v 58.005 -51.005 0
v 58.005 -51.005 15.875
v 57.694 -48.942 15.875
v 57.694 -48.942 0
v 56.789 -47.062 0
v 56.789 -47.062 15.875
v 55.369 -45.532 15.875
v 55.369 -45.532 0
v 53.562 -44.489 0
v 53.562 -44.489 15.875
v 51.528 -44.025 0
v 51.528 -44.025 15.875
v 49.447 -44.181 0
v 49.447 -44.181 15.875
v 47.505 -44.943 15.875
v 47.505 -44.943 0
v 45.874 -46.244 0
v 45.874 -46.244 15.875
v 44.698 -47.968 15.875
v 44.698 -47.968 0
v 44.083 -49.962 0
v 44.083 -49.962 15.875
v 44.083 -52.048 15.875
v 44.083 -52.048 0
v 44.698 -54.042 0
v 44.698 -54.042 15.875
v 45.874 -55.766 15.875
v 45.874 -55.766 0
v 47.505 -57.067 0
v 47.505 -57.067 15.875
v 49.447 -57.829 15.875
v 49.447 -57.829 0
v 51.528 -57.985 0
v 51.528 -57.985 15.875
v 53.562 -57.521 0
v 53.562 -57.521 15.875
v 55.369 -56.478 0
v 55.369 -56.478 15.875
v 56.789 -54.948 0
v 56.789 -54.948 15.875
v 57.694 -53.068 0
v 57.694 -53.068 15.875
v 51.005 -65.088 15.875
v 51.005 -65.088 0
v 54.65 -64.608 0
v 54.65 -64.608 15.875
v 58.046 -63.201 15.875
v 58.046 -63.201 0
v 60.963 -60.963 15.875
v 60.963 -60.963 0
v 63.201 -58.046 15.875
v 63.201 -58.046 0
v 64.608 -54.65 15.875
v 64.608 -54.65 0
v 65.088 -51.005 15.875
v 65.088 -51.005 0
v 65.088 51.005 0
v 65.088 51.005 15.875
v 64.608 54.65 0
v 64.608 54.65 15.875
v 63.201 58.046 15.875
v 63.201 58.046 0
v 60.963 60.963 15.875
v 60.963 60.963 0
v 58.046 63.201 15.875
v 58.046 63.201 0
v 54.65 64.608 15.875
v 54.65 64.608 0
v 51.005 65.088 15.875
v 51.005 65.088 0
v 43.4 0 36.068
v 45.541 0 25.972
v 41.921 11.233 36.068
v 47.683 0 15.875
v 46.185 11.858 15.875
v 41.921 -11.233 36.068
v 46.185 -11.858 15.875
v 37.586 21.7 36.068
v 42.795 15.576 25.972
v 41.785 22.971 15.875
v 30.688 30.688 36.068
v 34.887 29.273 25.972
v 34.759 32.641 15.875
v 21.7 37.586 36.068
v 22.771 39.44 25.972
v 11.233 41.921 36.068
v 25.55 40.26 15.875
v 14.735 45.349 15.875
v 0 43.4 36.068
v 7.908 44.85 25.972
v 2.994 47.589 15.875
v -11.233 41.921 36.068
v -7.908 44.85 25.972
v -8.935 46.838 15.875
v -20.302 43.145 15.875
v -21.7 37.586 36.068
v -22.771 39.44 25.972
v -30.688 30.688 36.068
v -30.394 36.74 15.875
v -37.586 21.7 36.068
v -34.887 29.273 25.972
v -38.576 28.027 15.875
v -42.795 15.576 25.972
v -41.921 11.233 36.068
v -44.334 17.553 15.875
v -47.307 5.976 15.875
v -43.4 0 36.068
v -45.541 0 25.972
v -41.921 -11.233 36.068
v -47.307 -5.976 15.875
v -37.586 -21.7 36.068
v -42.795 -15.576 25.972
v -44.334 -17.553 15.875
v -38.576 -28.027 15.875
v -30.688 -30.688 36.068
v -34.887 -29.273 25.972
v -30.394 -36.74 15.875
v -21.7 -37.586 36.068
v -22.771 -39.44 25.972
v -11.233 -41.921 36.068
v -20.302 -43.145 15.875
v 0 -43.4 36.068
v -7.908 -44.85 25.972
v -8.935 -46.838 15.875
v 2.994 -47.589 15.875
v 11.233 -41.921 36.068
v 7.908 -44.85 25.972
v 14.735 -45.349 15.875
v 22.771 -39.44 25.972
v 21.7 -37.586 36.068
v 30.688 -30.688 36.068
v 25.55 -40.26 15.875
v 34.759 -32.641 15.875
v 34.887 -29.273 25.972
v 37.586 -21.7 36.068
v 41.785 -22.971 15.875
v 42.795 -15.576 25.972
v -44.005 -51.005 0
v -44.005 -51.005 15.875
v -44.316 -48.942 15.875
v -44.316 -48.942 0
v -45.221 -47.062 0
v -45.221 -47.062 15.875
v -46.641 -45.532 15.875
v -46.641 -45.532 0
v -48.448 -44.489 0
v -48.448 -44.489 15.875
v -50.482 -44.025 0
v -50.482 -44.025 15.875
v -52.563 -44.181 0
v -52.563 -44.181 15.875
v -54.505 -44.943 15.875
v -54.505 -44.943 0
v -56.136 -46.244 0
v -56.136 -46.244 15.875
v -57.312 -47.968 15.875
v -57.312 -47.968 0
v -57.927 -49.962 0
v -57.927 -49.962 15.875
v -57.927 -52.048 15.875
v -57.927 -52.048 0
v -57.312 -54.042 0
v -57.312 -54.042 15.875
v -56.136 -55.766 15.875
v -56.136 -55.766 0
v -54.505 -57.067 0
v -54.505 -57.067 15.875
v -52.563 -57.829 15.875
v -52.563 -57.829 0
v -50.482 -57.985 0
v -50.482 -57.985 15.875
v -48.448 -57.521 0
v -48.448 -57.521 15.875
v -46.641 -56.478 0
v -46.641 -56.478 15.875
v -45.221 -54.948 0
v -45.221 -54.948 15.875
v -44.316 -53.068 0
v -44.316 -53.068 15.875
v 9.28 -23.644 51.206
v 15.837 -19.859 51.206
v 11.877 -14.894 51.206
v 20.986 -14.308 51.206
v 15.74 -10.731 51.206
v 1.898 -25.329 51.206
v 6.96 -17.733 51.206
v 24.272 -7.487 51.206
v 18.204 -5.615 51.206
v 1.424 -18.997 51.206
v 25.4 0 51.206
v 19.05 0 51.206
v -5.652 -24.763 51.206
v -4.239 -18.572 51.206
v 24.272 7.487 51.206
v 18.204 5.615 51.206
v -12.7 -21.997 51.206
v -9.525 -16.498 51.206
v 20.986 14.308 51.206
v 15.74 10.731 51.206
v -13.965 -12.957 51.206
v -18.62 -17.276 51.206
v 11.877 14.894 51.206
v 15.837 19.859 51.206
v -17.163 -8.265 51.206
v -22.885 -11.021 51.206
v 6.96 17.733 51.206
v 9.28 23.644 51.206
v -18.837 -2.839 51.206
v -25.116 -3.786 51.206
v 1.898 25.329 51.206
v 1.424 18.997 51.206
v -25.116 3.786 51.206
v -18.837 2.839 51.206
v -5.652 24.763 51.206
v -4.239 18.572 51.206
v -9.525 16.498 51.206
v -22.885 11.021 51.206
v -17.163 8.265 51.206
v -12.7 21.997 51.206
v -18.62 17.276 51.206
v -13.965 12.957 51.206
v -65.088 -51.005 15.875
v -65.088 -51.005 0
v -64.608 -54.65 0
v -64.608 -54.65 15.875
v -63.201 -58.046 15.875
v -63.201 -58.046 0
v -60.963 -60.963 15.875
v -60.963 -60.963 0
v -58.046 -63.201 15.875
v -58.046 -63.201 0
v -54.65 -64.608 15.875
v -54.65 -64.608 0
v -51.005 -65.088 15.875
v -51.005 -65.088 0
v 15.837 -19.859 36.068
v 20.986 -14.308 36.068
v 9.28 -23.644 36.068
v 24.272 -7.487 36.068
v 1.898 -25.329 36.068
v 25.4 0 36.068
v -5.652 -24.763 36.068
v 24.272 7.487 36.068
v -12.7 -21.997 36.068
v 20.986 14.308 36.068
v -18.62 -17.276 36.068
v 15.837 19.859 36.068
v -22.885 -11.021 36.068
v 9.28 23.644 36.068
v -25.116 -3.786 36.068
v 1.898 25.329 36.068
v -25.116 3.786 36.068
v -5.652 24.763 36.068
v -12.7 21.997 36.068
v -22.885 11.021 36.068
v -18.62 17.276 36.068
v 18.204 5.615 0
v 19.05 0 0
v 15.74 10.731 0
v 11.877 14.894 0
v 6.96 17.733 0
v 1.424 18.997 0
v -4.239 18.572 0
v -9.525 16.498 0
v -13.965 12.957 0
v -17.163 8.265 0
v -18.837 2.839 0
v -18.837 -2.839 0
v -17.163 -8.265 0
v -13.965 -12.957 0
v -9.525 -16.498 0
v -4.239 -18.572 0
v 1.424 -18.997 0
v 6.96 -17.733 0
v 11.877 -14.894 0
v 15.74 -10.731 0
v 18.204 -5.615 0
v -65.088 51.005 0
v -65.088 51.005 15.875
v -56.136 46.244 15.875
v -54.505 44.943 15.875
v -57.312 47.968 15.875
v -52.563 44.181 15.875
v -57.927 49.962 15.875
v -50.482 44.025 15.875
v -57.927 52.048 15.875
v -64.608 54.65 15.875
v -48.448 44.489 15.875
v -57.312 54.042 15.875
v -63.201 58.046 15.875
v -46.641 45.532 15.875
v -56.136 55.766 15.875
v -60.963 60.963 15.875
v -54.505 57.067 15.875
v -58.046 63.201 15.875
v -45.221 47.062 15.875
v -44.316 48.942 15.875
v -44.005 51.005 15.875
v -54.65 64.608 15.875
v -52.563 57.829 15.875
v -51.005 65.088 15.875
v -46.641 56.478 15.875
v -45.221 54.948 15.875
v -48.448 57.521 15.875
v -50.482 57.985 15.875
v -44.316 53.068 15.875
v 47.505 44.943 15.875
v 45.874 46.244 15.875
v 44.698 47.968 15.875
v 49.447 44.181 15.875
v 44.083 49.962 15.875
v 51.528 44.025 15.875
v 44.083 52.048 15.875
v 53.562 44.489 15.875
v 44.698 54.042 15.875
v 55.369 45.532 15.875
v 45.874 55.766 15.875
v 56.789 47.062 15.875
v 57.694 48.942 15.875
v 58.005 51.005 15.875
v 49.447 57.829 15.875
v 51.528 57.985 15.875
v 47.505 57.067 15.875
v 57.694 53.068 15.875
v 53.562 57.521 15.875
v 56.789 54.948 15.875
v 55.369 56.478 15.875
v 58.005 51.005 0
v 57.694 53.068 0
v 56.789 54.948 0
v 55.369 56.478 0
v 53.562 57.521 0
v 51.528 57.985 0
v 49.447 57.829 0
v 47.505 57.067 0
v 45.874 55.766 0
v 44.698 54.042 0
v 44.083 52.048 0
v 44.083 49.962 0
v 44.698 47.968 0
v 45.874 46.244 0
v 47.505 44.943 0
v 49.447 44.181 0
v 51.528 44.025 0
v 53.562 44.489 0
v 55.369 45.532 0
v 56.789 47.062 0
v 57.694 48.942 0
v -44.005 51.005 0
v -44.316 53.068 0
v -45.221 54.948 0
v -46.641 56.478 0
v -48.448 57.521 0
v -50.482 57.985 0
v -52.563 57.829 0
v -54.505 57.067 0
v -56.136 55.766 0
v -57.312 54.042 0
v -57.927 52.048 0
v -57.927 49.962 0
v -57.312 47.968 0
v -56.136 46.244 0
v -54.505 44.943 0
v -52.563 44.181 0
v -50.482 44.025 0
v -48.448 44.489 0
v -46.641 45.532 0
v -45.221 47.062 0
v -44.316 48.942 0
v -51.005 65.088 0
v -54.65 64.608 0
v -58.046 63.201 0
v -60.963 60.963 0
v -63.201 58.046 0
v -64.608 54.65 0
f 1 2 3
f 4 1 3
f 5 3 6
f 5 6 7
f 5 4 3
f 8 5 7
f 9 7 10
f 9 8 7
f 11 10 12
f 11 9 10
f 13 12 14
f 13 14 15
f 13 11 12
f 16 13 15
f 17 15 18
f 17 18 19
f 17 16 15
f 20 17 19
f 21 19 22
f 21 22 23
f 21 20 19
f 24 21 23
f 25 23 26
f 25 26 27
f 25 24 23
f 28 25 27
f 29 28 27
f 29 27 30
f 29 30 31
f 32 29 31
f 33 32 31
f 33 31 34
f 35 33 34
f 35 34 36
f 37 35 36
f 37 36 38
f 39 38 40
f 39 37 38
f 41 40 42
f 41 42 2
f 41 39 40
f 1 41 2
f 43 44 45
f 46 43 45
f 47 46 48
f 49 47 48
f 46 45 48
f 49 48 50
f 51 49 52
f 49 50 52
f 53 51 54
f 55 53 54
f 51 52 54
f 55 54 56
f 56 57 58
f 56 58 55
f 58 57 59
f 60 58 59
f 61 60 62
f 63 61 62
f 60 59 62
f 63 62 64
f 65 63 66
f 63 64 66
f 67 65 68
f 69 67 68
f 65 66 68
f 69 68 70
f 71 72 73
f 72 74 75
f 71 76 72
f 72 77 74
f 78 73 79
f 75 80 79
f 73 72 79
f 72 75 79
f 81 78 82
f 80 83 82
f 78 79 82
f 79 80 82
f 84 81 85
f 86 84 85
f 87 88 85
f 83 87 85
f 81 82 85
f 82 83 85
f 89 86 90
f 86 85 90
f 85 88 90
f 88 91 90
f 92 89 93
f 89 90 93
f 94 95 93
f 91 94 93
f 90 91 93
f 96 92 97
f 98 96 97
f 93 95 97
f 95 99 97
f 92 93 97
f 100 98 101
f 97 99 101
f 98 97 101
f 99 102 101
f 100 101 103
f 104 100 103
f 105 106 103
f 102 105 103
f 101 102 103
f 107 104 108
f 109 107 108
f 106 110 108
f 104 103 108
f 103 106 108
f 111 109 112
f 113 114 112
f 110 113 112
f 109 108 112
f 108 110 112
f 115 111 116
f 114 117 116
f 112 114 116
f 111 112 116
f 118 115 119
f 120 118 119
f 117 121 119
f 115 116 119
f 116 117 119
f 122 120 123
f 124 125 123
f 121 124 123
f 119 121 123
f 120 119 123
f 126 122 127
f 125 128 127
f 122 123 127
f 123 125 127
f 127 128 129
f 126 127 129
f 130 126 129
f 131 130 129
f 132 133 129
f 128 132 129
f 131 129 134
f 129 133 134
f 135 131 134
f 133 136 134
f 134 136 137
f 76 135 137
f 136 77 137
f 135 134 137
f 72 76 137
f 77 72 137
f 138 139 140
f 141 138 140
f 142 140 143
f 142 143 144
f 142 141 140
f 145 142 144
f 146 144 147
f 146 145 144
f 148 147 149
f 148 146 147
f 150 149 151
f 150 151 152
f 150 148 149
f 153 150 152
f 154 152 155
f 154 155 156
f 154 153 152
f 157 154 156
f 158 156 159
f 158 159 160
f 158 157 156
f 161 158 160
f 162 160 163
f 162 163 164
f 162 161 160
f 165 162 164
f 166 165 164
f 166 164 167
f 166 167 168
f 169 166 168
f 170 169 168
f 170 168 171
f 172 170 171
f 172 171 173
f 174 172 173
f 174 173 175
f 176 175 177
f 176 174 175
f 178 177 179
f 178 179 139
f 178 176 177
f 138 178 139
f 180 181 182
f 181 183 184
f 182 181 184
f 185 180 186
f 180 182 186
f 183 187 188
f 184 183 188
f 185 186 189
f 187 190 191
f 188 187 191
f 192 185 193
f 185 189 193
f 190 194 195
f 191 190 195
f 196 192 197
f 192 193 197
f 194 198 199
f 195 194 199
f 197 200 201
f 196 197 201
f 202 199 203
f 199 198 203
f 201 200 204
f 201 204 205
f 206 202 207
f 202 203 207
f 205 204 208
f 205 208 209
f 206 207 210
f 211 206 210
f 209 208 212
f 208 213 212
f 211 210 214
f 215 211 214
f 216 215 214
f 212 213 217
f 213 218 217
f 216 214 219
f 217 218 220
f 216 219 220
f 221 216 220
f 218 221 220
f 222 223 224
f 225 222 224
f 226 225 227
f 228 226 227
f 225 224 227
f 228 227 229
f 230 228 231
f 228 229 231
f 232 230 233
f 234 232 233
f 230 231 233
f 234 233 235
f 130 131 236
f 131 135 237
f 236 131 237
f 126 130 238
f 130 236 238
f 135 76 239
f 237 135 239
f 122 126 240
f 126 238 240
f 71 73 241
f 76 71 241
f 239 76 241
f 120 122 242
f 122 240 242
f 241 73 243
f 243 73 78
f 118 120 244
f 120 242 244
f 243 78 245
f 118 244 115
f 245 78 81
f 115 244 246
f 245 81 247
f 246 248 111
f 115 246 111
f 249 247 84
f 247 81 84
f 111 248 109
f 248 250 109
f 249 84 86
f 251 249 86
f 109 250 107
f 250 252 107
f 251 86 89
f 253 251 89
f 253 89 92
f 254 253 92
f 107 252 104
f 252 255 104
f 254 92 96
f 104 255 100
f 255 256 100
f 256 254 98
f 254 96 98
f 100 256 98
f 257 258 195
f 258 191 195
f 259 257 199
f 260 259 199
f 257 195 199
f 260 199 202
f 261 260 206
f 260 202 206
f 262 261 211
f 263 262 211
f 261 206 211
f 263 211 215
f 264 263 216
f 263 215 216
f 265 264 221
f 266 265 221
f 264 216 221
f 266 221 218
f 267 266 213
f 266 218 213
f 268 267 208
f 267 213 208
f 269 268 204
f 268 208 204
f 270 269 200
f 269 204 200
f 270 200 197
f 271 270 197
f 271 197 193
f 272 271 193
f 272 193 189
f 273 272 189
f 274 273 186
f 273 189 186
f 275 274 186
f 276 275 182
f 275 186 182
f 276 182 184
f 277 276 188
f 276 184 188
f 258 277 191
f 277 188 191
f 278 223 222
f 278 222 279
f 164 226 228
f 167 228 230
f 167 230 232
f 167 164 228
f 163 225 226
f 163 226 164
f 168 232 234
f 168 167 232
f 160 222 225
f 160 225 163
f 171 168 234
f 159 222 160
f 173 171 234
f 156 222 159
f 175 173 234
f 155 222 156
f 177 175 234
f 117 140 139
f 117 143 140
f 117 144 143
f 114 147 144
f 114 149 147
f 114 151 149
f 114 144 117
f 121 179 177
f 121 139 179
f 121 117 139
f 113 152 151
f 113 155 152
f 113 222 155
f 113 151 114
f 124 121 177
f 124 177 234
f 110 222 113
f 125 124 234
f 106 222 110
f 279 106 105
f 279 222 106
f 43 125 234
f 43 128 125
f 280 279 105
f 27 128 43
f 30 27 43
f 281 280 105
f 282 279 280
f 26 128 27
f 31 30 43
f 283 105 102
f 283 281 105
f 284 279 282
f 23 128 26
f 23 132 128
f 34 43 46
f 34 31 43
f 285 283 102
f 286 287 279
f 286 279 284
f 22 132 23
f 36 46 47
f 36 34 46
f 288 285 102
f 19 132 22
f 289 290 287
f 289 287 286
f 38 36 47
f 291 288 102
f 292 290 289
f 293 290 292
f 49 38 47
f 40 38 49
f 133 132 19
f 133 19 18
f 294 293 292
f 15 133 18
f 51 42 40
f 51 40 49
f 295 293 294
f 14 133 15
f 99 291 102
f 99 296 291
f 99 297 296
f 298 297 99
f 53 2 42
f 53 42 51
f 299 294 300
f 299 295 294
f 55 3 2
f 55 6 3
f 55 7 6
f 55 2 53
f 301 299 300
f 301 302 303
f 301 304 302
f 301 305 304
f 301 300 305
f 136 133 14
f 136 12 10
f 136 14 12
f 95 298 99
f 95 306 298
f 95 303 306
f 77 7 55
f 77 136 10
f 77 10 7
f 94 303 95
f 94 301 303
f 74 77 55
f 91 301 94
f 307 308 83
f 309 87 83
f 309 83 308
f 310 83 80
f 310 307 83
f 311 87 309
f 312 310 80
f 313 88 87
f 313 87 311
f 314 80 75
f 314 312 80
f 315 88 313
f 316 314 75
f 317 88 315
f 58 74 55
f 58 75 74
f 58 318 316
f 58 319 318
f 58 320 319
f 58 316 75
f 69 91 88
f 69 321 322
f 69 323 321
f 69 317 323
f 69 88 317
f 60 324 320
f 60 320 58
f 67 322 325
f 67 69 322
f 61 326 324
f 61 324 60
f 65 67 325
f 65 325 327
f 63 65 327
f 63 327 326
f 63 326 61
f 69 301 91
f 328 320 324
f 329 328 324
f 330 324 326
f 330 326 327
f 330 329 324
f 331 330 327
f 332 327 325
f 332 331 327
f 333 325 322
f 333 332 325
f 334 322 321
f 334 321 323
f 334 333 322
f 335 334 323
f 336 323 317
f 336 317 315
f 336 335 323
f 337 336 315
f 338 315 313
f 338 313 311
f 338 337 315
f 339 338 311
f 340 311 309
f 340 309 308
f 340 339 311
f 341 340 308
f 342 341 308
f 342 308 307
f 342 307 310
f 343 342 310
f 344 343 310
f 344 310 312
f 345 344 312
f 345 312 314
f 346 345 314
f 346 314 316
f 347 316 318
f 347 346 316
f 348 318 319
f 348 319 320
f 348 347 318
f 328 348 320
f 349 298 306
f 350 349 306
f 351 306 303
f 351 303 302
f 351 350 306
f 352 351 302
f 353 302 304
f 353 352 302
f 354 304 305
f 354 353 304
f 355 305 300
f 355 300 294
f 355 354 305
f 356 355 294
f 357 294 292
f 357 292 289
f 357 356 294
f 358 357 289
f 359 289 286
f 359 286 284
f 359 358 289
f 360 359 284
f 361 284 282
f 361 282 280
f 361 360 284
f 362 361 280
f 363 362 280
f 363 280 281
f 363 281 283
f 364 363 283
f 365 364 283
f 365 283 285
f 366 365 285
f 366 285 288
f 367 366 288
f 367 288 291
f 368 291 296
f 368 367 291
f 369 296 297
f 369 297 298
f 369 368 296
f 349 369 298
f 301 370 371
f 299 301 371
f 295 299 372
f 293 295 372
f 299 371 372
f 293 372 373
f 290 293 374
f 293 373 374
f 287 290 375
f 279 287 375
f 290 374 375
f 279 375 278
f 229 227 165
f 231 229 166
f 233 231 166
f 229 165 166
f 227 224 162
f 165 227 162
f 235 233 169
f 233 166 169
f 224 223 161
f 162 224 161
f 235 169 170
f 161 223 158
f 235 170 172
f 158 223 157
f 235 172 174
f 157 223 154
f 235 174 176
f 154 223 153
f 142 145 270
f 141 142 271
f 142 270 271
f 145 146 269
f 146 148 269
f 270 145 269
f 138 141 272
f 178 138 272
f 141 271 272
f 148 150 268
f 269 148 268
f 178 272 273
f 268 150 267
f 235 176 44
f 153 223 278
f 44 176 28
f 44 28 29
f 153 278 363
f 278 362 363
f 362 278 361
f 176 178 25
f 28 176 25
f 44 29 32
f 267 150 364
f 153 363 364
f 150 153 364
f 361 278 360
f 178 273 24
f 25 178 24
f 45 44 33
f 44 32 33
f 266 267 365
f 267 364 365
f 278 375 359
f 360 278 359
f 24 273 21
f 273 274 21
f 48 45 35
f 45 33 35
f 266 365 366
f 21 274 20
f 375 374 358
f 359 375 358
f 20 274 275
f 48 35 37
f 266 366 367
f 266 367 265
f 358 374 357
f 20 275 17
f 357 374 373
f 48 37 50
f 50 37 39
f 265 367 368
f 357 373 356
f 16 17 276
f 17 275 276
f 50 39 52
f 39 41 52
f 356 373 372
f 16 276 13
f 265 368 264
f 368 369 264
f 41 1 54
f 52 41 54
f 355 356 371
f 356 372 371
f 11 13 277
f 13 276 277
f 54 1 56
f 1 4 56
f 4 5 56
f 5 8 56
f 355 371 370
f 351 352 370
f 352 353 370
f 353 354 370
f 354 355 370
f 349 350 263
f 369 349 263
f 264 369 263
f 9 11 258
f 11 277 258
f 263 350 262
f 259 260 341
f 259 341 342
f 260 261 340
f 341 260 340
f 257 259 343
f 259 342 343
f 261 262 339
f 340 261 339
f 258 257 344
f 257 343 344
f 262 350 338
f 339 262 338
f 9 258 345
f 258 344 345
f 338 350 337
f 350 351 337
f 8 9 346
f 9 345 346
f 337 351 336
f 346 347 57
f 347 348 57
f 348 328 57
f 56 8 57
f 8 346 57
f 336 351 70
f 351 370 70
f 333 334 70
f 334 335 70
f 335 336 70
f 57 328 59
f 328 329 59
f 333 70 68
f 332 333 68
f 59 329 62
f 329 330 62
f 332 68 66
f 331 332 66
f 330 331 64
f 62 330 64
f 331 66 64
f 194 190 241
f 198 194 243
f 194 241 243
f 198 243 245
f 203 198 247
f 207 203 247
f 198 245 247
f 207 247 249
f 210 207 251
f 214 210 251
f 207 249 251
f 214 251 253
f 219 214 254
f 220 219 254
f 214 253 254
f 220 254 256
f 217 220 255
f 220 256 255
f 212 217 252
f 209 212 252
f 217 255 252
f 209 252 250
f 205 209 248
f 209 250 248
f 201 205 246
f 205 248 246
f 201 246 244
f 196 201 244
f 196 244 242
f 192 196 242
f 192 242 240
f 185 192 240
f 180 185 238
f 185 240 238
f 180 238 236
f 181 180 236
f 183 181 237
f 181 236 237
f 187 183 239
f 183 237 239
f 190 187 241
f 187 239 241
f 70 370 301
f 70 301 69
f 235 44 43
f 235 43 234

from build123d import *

# Parameters (mm, degrees)
SKETCH001_R   = 7
SKETCH001_R_2 = 19.05
PAD_DEPTH     = 15.875


with BuildPart() as part:
    # Sketch → Revolution (revolve)
    with BuildSketch(Plane.XZ):
        Polygon((19.05, 0), (19.05, 51.2064), (25.4, 51.2064), (25.4, 36.068), (43.4, 36.068), (51.05, 0), align=None)
    revolve(axis=Axis((0, 0, 0), (0, 0, 1)))

    # Sketch001 → Pad (new body)
    with BuildSketch(Plane.XY):
        with BuildLine():
            ThreePointArc((-51.005, 65.0875), (-60.962831, 60.962831), (-65.0875, 51.005))
            Line((-65.0875, -51.005), (-65.0875, 51.005))
            ThreePointArc((-65.0875, -51.005), (-60.962831, -60.962831), (-51.005, -65.0875))
            Line((51.005, -65.0875), (-51.005, -65.0875))
            ThreePointArc((51.005, -65.0875), (60.962831, -60.962831), (65.0875, -51.005))
            Line((65.0875, 51.005), (65.0875, -51.005))
            ThreePointArc((65.0875, 51.005), (60.962831, 60.962831), (51.005, 65.0875))
            Line((-51.005, 65.0875), (51.005, 65.0875))
        make_face()
        with Locations((51.005, 51.005)):
            Circle(SKETCH001_R, mode=Mode.SUBTRACT)
        with Locations((-51.005, 51.005)):
            Circle(SKETCH001_R, mode=Mode.SUBTRACT)
        with Locations((-51.005, -51.005)):
            Circle(SKETCH001_R, mode=Mode.SUBTRACT)
        with Locations((51.005, -51.005)):
            Circle(SKETCH001_R, mode=Mode.SUBTRACT)
        Circle(SKETCH001_R_2, mode=Mode.SUBTRACT)
    extrude(amount=PAD_DEPTH)


solid = part.part
